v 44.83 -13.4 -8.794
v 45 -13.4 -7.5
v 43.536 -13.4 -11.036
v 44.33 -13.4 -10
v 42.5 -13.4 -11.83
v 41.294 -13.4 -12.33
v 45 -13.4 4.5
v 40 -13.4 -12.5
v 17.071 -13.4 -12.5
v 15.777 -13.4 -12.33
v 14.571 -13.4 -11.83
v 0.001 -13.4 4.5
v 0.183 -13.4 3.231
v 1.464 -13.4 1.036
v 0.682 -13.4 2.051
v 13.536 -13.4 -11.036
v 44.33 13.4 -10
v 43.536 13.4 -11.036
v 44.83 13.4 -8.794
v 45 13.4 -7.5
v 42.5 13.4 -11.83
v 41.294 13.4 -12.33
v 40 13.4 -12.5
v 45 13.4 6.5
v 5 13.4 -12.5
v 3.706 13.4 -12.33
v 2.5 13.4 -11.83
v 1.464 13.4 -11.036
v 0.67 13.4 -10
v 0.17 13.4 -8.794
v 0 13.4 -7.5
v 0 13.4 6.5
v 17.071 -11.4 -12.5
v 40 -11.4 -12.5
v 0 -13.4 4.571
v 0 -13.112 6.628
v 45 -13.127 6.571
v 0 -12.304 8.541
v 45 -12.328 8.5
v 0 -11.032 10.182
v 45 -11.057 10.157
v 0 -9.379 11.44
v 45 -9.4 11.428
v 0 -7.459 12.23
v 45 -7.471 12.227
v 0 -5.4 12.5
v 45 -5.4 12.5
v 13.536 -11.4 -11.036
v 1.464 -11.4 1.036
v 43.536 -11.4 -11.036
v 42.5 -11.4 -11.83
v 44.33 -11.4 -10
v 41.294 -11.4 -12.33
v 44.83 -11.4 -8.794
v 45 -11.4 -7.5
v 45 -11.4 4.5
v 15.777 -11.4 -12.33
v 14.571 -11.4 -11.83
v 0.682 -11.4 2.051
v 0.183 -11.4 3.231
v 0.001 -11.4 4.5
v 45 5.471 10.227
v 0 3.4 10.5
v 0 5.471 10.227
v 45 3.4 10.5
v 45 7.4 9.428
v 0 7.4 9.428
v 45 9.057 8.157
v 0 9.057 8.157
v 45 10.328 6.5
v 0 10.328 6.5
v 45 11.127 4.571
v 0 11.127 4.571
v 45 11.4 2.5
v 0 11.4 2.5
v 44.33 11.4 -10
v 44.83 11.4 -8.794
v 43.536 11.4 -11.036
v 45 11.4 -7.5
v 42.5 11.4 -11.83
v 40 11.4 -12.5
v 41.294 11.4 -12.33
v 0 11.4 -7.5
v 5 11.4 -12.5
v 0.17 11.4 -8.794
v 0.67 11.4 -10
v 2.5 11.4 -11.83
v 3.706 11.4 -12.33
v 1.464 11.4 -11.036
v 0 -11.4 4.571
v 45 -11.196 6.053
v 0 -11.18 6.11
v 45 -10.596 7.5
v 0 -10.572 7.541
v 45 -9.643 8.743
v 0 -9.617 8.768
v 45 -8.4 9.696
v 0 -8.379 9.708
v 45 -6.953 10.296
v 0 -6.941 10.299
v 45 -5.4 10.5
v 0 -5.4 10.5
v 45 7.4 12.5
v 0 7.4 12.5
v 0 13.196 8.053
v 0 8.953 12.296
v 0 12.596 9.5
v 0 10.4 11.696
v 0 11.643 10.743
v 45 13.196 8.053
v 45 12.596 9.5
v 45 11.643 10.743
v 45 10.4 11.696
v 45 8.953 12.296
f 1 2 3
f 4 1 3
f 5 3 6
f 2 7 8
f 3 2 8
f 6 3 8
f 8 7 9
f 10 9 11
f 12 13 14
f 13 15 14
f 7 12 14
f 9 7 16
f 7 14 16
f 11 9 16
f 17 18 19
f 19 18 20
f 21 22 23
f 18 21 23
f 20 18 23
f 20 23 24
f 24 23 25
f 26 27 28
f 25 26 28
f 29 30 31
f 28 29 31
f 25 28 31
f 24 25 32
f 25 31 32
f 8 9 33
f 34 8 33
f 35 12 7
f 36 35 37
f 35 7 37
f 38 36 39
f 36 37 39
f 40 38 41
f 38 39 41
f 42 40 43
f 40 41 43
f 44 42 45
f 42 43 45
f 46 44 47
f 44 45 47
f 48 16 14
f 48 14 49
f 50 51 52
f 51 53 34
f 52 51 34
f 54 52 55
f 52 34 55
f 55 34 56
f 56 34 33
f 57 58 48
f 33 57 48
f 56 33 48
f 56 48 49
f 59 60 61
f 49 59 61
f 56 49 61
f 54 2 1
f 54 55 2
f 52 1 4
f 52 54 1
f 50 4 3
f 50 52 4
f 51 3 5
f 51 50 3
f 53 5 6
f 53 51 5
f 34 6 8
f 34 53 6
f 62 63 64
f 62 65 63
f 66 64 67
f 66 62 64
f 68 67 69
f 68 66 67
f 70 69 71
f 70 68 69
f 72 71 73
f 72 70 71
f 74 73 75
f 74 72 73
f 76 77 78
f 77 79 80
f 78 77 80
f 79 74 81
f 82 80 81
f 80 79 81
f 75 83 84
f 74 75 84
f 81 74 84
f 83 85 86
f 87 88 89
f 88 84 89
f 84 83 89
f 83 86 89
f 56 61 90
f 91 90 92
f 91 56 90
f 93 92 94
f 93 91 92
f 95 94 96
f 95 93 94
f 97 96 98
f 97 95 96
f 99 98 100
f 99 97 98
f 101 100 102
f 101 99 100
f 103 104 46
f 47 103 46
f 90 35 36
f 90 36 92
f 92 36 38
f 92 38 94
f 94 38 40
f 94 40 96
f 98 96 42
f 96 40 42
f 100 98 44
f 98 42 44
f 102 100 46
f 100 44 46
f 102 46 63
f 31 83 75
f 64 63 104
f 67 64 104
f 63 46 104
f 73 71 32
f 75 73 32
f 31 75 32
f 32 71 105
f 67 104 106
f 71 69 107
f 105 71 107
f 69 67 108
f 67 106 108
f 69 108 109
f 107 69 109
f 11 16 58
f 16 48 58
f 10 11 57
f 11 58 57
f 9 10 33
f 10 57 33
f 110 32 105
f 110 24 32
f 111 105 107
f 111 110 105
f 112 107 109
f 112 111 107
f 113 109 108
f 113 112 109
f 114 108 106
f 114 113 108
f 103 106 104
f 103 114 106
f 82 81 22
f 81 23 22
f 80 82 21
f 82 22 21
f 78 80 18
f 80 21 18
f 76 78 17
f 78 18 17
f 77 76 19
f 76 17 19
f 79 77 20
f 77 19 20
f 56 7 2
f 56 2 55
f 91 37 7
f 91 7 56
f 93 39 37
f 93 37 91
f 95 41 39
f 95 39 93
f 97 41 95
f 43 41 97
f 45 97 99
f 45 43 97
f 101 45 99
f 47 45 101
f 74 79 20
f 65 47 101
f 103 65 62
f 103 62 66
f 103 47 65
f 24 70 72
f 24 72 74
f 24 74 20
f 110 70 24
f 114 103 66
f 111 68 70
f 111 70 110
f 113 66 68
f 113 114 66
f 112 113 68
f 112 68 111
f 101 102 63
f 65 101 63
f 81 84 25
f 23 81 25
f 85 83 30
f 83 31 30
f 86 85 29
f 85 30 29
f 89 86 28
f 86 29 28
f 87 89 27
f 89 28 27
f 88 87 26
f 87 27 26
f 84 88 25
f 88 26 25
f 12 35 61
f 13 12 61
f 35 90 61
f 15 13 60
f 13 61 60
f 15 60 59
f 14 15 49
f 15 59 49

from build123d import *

# Parameters (mm, degrees)
F1_DEPTH = 45
F2_R     = 6
F3_R     = 8
F4_R     = 5
F5_SIZE  = 15
F6_R     = 5
F7_R     = 5
F8_R     = 8
F9_R     = 6


with BuildPart() as f1:
    # F0 (on Right) → F1 (new body)
    with BuildSketch(Plane.YZ):
        Polygon((13.4, 12.5), (-13.4, 12.5), (-13.4, -12.5), (-11.4, -12.5), (-11.4, 10.5), (11.4, 10.5), (11.4, -12.5), (13.4, -12.5), align=None)
    extrude(amount=F1_DEPTH)

    # F2
    f2_edges = [f1.edges().sort_by_distance(p)[0] for p in [
        (22.5, -11.4, 10.5),
    ]]
    fillet(f2_edges, radius=F2_R)

    # F3
    f3_edges = [f1.edges().sort_by_distance(p)[0] for p in [
        (22.5, -13.4, 12.5),
    ]]
    fillet(f3_edges, radius=F3_R)

    # F4
    f4_edges = [f1.edges().sort_by_distance(p)[0] for p in [
        (0, 12.4, -12.5),
        (45, 12.4, -12.5),
    ]]
    fillet(f4_edges, radius=F4_R)

    # F5
    f5_edges = [f1.edges().sort_by_distance(p)[0] for p in [
        (0, -12.4, -12.5),
    ]]
    chamfer(f5_edges, length=F5_SIZE)

    # F6
    f6_edges = [f1.edges().sort_by_distance(p)[0] for p in [
        (0, -12.4, 2.5),
        (15, -12.4, -12.5),
    ]]
    fillet(f6_edges, radius=F6_R)

    # F7
    f7_edges = [f1.edges().sort_by_distance(p)[0] for p in [
        (45, -12.4, -12.5),
    ]]
    fillet(f7_edges, radius=F7_R)

    # F8
    f8_edges = [f1.edges().sort_by_distance(p)[0] for p in [
        (22.5, 11.4, 10.5),
    ]]
    fillet(f8_edges, radius=F8_R)

    # F9
    f9_edges = [f1.edges().sort_by_distance(p)[0] for p in [
        (22.5, 13.4, 12.5),
    ]]
    fillet(f9_edges, radius=F9_R)


solid = f1.part
